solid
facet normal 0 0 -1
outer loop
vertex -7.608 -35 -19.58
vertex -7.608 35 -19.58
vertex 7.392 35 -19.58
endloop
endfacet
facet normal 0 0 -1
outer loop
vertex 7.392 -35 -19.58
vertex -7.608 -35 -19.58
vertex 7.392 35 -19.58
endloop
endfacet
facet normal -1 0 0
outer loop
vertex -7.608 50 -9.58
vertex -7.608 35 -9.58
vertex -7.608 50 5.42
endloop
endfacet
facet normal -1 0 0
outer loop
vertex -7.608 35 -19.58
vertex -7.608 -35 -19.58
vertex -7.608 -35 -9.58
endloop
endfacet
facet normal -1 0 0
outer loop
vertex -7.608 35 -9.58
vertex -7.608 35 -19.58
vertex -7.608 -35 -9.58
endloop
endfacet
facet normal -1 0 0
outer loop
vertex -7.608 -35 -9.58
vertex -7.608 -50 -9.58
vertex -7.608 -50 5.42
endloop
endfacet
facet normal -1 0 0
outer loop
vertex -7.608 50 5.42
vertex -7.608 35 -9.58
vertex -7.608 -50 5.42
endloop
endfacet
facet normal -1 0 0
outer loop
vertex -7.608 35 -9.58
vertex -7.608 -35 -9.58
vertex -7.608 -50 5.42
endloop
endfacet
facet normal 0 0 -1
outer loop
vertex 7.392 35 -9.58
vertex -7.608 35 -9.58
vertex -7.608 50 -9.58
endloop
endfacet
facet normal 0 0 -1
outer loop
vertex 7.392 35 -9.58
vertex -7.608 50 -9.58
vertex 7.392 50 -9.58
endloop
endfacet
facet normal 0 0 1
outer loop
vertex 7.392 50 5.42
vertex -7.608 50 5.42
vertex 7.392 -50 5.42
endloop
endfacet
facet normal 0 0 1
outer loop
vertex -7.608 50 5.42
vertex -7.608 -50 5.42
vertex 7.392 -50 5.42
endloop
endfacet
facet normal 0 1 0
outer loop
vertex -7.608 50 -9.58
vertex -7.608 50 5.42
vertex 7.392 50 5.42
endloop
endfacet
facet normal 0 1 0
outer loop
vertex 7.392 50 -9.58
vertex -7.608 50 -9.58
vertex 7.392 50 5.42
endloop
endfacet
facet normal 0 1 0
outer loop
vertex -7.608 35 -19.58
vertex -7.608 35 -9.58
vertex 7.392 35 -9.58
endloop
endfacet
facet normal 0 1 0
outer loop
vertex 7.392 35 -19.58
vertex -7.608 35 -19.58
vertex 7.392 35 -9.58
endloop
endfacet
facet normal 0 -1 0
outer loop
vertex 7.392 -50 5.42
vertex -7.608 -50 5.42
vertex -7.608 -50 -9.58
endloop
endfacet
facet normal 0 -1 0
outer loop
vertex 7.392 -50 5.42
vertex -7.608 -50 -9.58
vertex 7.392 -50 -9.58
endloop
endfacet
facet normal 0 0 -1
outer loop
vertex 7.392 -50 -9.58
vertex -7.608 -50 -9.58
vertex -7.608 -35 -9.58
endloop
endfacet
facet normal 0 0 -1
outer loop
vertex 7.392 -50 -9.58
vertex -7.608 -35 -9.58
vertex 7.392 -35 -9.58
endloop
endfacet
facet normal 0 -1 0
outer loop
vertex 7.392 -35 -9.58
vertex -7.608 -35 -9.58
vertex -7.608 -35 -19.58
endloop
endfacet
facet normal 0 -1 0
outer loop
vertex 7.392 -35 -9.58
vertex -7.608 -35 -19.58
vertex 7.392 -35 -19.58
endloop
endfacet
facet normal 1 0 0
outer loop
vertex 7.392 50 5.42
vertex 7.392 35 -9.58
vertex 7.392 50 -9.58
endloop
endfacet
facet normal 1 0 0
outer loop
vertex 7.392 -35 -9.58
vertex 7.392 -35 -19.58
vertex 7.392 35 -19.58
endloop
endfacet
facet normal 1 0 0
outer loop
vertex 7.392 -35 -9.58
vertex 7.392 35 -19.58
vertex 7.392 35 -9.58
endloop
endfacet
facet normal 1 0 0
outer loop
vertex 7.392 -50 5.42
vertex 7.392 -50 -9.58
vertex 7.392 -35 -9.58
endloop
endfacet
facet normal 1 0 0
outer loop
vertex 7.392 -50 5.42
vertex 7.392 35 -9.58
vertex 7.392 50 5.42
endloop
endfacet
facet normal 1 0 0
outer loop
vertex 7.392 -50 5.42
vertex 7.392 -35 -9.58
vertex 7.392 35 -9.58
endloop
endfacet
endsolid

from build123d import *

# Parameters (mm, degrees)
F0_W     = 15
F0_H     = 15
F1_DEPTH = 50
F0_H_2   = 10
F2_DEPTH = 35


with BuildPart() as f1:
    # F0 (on Front) → F1 (new body, symmetric)
    with BuildSketch(Plane.XZ):
        with Locations((-0.108219, -2.080006)):
            Rectangle(F0_W, F0_H)
    extrude(amount=F1_DEPTH, both=True)

    # F0 (on Front) → F2 (join, symmetric)
    with BuildSketch(Plane.XZ):
        with Locations((-0.108219, -14.580006)):
            Rectangle(F0_W, F0_H_2)
    extrude(amount=F2_DEPTH, both=True)


solid = f1.part
